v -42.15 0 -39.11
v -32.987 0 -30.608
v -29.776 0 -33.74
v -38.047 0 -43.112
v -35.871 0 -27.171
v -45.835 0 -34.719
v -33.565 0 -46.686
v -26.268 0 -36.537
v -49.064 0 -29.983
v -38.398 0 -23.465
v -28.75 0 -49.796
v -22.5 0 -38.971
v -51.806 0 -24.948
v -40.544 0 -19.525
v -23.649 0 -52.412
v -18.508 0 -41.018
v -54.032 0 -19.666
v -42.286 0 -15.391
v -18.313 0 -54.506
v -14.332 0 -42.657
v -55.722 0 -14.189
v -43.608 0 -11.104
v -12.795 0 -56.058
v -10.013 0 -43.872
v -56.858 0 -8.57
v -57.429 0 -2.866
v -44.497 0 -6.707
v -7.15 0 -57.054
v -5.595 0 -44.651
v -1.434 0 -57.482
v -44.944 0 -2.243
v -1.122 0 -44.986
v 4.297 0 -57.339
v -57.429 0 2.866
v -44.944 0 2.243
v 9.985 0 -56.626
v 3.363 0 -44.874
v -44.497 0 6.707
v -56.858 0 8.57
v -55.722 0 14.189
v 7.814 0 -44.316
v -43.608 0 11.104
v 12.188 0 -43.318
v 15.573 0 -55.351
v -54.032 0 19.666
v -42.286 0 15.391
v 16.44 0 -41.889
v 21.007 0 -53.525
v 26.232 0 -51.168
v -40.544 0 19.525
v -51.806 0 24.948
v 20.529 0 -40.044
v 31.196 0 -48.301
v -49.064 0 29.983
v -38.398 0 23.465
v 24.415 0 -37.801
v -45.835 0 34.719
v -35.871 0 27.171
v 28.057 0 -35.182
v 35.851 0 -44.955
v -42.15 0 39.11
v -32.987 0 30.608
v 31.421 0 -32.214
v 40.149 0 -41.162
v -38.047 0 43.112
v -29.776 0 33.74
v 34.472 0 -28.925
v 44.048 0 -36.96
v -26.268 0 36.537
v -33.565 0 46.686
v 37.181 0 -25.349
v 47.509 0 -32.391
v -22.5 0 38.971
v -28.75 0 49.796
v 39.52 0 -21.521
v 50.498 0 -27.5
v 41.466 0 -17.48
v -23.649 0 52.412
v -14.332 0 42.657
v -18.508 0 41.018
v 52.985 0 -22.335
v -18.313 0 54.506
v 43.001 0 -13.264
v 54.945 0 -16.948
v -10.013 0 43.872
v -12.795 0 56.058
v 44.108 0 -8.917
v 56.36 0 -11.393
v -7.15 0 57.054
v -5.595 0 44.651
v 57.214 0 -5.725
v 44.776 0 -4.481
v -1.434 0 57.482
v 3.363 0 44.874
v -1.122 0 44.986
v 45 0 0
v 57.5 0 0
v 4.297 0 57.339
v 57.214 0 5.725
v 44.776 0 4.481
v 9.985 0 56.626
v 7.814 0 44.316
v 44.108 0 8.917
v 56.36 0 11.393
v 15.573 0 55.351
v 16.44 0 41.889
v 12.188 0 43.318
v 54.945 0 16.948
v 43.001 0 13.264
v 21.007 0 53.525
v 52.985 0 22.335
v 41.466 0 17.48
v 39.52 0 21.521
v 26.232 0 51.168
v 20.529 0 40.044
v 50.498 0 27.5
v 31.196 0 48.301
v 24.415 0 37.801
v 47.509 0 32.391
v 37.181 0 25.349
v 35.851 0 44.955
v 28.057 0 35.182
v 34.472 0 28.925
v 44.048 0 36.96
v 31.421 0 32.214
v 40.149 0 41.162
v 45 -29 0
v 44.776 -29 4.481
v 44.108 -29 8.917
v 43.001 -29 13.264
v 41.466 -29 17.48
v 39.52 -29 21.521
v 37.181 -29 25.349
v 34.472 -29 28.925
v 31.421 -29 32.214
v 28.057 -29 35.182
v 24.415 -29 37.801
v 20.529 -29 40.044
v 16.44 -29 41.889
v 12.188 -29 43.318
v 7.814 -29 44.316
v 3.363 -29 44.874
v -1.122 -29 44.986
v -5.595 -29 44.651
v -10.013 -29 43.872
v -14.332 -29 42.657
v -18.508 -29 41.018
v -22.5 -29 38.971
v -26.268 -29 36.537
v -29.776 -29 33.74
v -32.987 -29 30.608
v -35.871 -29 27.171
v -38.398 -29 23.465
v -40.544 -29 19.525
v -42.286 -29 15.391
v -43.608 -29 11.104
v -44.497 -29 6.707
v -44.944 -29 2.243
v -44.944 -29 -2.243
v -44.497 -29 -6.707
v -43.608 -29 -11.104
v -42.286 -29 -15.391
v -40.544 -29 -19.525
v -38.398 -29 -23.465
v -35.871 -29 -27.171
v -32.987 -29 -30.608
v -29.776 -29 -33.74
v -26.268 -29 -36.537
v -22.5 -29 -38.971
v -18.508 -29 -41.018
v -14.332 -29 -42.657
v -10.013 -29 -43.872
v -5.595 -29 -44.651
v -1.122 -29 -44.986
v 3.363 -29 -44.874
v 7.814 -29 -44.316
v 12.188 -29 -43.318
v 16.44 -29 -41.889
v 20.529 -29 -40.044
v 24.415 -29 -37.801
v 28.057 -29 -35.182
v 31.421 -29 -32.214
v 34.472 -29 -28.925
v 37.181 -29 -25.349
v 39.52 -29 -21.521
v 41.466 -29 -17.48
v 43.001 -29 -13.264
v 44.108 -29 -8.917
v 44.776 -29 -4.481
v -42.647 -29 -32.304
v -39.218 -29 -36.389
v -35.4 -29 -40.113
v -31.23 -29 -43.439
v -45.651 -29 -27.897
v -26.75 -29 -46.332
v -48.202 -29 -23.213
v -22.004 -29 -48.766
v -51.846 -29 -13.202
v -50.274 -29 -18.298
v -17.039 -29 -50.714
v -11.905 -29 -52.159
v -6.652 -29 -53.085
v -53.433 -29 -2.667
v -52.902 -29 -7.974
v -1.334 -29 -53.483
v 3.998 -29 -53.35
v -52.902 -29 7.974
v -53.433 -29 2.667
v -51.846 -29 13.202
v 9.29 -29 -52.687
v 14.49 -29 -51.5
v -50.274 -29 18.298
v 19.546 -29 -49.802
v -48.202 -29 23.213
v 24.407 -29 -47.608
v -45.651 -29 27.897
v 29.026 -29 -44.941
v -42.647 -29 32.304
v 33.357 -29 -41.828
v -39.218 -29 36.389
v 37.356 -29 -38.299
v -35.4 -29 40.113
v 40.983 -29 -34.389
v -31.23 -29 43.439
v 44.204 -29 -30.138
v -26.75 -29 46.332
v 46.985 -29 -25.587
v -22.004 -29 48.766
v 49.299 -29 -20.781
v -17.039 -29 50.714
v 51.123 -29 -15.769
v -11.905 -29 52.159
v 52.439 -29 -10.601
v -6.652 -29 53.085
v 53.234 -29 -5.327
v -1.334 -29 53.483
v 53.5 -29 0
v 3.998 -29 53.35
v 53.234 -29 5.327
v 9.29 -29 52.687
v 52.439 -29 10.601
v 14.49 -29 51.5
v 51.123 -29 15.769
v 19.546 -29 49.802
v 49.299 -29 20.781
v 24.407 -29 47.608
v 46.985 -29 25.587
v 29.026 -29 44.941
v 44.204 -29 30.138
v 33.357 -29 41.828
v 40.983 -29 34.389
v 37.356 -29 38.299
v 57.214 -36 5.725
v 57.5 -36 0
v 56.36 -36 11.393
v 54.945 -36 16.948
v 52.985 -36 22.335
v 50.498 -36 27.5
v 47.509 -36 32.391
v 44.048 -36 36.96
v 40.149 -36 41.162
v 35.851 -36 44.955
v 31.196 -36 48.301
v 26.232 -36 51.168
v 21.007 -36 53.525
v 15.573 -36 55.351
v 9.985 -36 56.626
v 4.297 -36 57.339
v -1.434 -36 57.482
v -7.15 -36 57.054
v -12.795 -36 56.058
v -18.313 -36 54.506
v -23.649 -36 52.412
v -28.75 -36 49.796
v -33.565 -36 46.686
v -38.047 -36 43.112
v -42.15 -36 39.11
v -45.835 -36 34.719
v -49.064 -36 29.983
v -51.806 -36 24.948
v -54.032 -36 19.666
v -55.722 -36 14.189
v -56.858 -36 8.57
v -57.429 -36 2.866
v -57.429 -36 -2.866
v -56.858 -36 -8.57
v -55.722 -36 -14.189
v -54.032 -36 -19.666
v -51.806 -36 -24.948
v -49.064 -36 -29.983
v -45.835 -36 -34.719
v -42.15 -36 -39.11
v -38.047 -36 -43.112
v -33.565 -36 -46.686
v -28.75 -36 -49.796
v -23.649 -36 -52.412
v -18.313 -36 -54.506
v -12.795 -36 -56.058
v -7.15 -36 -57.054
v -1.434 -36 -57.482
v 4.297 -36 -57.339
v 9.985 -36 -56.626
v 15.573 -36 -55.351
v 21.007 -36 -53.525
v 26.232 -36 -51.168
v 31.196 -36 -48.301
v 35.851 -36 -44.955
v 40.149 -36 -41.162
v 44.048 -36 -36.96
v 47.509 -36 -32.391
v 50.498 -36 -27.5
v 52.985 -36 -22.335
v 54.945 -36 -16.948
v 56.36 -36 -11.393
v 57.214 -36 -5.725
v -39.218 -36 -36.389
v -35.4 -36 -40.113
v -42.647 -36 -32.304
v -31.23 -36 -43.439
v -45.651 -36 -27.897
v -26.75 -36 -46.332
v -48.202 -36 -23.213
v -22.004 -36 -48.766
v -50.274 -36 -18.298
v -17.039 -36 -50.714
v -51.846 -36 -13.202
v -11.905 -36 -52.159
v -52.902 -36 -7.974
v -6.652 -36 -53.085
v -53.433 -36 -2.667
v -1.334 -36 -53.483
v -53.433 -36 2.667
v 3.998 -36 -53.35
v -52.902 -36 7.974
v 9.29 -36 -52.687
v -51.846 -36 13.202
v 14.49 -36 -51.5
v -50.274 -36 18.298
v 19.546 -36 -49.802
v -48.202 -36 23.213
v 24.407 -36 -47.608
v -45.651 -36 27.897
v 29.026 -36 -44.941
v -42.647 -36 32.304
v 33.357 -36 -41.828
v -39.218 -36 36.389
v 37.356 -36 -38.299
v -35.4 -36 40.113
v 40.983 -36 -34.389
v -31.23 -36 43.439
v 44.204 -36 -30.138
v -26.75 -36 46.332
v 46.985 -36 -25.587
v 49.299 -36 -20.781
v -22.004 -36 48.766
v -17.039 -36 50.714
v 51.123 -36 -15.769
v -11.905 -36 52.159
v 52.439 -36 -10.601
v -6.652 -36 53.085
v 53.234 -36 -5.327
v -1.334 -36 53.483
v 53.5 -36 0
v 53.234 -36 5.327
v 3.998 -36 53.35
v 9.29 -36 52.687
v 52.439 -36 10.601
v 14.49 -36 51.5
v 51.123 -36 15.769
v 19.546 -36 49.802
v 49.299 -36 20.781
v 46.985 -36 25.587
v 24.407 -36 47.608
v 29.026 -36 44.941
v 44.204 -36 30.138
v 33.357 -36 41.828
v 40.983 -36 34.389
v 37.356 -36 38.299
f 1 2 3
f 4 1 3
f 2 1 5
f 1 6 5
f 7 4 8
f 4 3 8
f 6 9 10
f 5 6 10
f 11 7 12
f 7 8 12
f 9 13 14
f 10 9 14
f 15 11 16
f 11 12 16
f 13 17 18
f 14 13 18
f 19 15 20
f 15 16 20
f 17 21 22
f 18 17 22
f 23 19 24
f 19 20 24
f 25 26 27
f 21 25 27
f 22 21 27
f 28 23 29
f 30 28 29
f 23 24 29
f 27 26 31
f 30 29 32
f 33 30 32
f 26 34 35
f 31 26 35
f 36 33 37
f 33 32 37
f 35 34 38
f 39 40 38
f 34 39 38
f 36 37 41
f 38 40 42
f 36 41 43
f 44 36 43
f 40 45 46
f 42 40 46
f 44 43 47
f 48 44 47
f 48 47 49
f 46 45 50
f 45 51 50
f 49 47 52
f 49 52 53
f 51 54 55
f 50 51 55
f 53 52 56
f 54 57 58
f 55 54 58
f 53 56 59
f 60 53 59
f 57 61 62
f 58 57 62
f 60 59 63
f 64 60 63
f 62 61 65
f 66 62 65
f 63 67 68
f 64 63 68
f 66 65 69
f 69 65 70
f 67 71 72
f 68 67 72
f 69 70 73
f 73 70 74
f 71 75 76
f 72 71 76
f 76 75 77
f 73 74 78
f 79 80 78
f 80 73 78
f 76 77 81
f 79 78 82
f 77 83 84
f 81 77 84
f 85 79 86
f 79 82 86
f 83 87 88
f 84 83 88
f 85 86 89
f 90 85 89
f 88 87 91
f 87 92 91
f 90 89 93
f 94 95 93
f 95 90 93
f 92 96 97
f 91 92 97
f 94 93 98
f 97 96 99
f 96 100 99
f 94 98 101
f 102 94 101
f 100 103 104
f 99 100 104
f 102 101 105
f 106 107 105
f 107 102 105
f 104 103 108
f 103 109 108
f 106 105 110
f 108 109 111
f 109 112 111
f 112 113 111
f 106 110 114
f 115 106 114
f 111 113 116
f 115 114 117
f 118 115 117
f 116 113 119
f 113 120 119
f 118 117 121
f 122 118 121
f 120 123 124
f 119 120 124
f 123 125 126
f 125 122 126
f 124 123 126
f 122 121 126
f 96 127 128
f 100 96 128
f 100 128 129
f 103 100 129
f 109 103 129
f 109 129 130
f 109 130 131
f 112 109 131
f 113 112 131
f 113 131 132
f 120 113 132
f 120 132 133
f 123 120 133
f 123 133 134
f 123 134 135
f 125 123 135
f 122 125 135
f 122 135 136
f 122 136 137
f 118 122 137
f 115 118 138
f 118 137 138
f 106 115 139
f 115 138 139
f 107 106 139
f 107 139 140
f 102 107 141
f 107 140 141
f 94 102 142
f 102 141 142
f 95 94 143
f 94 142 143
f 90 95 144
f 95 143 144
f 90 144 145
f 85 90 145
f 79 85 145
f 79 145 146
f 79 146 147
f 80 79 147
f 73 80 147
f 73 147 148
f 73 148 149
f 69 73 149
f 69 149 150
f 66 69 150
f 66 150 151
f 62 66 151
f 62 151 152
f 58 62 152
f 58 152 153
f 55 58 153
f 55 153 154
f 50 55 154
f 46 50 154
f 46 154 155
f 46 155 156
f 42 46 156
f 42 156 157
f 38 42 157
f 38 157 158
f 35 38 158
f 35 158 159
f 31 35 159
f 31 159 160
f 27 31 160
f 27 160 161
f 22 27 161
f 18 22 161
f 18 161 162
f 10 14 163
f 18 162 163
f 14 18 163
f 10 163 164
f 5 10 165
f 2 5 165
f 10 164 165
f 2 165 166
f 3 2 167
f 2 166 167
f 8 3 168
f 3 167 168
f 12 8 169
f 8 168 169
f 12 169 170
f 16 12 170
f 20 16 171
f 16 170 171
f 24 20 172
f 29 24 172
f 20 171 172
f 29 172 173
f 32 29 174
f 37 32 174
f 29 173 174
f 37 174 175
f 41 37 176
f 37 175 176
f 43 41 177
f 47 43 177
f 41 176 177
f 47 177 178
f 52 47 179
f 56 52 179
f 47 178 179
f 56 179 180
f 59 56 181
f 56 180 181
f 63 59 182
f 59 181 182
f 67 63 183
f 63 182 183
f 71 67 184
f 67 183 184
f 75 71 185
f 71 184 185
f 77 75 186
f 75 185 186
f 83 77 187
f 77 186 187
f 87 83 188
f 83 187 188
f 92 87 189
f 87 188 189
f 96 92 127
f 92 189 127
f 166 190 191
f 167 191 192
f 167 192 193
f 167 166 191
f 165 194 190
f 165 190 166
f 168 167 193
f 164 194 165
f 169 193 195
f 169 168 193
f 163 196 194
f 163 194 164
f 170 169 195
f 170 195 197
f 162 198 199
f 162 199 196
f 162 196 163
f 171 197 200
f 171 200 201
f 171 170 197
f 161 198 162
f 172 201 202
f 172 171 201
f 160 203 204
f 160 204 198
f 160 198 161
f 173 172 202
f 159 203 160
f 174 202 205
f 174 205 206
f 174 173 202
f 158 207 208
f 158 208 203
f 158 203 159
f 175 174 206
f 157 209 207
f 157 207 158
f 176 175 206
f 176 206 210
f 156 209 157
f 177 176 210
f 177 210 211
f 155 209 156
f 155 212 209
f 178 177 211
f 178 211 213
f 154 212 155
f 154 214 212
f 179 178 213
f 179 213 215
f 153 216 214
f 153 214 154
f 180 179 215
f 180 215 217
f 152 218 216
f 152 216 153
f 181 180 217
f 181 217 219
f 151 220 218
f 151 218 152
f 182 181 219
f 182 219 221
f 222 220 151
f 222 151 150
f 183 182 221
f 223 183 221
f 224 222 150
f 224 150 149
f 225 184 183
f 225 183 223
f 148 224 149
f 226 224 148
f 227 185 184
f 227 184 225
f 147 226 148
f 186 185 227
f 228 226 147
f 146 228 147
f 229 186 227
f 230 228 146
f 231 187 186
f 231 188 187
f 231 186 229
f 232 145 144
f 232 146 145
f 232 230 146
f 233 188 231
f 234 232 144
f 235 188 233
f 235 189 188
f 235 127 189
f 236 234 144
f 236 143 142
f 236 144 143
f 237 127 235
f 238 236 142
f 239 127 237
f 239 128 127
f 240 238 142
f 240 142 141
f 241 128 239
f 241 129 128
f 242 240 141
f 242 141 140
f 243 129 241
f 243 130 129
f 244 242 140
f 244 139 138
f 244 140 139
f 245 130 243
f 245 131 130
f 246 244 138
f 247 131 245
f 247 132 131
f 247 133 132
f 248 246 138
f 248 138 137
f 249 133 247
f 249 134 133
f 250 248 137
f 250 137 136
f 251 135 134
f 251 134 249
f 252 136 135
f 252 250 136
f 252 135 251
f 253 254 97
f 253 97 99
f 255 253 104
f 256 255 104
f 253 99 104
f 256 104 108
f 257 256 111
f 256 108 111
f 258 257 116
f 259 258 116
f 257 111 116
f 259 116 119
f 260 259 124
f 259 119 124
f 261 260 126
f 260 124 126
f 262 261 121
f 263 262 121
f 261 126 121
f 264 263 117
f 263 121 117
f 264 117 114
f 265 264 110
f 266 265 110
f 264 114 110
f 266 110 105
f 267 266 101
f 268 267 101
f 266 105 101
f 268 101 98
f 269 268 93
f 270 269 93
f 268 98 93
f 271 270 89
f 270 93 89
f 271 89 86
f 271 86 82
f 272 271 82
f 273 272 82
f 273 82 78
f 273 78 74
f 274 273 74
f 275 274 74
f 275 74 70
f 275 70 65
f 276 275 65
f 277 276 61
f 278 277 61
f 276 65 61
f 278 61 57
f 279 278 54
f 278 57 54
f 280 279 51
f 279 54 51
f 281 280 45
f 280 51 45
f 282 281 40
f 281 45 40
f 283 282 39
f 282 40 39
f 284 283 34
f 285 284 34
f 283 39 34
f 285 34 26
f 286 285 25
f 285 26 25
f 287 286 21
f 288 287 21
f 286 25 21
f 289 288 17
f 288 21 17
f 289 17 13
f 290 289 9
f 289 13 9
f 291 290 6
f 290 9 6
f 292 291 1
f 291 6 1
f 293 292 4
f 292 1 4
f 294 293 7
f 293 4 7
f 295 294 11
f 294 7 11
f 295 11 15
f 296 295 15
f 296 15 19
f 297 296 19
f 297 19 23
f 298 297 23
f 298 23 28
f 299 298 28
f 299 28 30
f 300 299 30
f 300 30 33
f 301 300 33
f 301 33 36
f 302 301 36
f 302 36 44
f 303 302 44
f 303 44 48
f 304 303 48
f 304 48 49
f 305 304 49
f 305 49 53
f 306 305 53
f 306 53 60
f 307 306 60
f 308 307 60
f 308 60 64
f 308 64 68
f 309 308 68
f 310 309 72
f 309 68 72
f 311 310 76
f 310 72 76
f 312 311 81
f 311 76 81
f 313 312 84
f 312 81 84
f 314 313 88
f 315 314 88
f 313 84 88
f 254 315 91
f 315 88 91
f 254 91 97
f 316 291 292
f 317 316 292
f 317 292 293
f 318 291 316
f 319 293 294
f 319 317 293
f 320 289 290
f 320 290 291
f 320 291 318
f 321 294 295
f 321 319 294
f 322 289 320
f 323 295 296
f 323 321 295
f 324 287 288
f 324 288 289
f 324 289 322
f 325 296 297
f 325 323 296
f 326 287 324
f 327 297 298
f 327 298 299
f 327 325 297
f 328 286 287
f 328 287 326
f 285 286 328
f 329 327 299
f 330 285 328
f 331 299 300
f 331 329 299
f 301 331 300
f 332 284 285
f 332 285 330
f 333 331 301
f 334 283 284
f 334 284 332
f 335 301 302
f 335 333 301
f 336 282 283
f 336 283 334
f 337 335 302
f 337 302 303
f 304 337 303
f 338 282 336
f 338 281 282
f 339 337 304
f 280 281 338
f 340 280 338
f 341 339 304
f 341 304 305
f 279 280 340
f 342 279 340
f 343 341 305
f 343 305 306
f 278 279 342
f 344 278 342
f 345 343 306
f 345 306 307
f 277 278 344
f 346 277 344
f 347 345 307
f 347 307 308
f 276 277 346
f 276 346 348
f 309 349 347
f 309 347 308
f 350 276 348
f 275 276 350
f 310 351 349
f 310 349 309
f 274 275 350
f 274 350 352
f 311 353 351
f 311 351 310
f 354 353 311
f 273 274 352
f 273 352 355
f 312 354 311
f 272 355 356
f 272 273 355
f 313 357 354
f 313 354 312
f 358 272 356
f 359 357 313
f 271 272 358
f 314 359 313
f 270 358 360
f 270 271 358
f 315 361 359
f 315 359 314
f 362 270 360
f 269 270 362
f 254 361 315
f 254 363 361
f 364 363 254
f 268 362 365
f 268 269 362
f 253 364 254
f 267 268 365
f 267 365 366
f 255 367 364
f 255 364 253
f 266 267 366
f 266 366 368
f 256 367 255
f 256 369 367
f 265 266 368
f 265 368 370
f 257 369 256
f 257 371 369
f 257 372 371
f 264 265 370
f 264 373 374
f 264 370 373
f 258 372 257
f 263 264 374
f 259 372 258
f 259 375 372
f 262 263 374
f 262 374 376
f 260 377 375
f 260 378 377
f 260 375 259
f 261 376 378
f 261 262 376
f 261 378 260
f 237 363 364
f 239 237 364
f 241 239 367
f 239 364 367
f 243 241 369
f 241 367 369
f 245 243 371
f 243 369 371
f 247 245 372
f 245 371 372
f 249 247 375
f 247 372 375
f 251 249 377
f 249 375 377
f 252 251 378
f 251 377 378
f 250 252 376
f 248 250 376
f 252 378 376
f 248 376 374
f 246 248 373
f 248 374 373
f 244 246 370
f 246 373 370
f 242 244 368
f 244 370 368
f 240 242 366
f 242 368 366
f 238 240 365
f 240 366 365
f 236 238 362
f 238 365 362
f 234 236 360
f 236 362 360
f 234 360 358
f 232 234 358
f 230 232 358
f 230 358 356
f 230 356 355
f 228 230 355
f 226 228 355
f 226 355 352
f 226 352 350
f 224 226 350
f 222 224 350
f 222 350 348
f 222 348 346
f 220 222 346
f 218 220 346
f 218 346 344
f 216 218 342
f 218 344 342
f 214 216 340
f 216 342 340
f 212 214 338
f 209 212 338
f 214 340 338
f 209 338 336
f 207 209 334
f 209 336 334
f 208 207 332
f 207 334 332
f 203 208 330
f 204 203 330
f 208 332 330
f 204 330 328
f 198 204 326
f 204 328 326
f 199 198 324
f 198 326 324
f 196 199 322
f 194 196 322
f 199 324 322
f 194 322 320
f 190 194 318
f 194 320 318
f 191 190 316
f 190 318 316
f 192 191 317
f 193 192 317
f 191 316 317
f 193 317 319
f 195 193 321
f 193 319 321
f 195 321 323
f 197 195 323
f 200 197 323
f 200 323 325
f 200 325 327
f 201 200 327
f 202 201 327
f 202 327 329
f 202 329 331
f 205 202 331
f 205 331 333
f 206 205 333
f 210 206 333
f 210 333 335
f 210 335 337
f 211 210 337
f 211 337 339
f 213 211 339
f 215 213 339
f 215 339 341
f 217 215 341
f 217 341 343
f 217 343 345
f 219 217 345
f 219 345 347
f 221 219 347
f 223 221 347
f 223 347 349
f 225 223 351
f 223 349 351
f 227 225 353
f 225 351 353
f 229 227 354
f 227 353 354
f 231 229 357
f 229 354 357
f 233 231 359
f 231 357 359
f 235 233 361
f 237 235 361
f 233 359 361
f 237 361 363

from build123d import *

# Parameters (mm, degrees)
F0_R     = 57.5
F1_DEPTH = 36
F2_R     = 53.5
F3_DEPTH = 7
F4_R     = 45
F5_DEPTH = 29.001


with BuildPart() as f1:
    # F0 (on Front) → F1 (new body)
    with BuildSketch(Plane.XZ):
        Circle(F0_R)
    extrude(amount=F1_DEPTH)

    # F2 (on face) → F3 (cut)
    with BuildSketch(Plane.XZ.offset(36)):
        Circle(F2_R)
    extrude(amount=-F3_DEPTH, mode=Mode.SUBTRACT)

    # F4 (on face) → F5 (cut, through all)
    with BuildSketch(Plane.XZ.offset(29)):
        Circle(F4_R)
    extrude(amount=-F5_DEPTH, mode=Mode.SUBTRACT)


solid = f1.part
